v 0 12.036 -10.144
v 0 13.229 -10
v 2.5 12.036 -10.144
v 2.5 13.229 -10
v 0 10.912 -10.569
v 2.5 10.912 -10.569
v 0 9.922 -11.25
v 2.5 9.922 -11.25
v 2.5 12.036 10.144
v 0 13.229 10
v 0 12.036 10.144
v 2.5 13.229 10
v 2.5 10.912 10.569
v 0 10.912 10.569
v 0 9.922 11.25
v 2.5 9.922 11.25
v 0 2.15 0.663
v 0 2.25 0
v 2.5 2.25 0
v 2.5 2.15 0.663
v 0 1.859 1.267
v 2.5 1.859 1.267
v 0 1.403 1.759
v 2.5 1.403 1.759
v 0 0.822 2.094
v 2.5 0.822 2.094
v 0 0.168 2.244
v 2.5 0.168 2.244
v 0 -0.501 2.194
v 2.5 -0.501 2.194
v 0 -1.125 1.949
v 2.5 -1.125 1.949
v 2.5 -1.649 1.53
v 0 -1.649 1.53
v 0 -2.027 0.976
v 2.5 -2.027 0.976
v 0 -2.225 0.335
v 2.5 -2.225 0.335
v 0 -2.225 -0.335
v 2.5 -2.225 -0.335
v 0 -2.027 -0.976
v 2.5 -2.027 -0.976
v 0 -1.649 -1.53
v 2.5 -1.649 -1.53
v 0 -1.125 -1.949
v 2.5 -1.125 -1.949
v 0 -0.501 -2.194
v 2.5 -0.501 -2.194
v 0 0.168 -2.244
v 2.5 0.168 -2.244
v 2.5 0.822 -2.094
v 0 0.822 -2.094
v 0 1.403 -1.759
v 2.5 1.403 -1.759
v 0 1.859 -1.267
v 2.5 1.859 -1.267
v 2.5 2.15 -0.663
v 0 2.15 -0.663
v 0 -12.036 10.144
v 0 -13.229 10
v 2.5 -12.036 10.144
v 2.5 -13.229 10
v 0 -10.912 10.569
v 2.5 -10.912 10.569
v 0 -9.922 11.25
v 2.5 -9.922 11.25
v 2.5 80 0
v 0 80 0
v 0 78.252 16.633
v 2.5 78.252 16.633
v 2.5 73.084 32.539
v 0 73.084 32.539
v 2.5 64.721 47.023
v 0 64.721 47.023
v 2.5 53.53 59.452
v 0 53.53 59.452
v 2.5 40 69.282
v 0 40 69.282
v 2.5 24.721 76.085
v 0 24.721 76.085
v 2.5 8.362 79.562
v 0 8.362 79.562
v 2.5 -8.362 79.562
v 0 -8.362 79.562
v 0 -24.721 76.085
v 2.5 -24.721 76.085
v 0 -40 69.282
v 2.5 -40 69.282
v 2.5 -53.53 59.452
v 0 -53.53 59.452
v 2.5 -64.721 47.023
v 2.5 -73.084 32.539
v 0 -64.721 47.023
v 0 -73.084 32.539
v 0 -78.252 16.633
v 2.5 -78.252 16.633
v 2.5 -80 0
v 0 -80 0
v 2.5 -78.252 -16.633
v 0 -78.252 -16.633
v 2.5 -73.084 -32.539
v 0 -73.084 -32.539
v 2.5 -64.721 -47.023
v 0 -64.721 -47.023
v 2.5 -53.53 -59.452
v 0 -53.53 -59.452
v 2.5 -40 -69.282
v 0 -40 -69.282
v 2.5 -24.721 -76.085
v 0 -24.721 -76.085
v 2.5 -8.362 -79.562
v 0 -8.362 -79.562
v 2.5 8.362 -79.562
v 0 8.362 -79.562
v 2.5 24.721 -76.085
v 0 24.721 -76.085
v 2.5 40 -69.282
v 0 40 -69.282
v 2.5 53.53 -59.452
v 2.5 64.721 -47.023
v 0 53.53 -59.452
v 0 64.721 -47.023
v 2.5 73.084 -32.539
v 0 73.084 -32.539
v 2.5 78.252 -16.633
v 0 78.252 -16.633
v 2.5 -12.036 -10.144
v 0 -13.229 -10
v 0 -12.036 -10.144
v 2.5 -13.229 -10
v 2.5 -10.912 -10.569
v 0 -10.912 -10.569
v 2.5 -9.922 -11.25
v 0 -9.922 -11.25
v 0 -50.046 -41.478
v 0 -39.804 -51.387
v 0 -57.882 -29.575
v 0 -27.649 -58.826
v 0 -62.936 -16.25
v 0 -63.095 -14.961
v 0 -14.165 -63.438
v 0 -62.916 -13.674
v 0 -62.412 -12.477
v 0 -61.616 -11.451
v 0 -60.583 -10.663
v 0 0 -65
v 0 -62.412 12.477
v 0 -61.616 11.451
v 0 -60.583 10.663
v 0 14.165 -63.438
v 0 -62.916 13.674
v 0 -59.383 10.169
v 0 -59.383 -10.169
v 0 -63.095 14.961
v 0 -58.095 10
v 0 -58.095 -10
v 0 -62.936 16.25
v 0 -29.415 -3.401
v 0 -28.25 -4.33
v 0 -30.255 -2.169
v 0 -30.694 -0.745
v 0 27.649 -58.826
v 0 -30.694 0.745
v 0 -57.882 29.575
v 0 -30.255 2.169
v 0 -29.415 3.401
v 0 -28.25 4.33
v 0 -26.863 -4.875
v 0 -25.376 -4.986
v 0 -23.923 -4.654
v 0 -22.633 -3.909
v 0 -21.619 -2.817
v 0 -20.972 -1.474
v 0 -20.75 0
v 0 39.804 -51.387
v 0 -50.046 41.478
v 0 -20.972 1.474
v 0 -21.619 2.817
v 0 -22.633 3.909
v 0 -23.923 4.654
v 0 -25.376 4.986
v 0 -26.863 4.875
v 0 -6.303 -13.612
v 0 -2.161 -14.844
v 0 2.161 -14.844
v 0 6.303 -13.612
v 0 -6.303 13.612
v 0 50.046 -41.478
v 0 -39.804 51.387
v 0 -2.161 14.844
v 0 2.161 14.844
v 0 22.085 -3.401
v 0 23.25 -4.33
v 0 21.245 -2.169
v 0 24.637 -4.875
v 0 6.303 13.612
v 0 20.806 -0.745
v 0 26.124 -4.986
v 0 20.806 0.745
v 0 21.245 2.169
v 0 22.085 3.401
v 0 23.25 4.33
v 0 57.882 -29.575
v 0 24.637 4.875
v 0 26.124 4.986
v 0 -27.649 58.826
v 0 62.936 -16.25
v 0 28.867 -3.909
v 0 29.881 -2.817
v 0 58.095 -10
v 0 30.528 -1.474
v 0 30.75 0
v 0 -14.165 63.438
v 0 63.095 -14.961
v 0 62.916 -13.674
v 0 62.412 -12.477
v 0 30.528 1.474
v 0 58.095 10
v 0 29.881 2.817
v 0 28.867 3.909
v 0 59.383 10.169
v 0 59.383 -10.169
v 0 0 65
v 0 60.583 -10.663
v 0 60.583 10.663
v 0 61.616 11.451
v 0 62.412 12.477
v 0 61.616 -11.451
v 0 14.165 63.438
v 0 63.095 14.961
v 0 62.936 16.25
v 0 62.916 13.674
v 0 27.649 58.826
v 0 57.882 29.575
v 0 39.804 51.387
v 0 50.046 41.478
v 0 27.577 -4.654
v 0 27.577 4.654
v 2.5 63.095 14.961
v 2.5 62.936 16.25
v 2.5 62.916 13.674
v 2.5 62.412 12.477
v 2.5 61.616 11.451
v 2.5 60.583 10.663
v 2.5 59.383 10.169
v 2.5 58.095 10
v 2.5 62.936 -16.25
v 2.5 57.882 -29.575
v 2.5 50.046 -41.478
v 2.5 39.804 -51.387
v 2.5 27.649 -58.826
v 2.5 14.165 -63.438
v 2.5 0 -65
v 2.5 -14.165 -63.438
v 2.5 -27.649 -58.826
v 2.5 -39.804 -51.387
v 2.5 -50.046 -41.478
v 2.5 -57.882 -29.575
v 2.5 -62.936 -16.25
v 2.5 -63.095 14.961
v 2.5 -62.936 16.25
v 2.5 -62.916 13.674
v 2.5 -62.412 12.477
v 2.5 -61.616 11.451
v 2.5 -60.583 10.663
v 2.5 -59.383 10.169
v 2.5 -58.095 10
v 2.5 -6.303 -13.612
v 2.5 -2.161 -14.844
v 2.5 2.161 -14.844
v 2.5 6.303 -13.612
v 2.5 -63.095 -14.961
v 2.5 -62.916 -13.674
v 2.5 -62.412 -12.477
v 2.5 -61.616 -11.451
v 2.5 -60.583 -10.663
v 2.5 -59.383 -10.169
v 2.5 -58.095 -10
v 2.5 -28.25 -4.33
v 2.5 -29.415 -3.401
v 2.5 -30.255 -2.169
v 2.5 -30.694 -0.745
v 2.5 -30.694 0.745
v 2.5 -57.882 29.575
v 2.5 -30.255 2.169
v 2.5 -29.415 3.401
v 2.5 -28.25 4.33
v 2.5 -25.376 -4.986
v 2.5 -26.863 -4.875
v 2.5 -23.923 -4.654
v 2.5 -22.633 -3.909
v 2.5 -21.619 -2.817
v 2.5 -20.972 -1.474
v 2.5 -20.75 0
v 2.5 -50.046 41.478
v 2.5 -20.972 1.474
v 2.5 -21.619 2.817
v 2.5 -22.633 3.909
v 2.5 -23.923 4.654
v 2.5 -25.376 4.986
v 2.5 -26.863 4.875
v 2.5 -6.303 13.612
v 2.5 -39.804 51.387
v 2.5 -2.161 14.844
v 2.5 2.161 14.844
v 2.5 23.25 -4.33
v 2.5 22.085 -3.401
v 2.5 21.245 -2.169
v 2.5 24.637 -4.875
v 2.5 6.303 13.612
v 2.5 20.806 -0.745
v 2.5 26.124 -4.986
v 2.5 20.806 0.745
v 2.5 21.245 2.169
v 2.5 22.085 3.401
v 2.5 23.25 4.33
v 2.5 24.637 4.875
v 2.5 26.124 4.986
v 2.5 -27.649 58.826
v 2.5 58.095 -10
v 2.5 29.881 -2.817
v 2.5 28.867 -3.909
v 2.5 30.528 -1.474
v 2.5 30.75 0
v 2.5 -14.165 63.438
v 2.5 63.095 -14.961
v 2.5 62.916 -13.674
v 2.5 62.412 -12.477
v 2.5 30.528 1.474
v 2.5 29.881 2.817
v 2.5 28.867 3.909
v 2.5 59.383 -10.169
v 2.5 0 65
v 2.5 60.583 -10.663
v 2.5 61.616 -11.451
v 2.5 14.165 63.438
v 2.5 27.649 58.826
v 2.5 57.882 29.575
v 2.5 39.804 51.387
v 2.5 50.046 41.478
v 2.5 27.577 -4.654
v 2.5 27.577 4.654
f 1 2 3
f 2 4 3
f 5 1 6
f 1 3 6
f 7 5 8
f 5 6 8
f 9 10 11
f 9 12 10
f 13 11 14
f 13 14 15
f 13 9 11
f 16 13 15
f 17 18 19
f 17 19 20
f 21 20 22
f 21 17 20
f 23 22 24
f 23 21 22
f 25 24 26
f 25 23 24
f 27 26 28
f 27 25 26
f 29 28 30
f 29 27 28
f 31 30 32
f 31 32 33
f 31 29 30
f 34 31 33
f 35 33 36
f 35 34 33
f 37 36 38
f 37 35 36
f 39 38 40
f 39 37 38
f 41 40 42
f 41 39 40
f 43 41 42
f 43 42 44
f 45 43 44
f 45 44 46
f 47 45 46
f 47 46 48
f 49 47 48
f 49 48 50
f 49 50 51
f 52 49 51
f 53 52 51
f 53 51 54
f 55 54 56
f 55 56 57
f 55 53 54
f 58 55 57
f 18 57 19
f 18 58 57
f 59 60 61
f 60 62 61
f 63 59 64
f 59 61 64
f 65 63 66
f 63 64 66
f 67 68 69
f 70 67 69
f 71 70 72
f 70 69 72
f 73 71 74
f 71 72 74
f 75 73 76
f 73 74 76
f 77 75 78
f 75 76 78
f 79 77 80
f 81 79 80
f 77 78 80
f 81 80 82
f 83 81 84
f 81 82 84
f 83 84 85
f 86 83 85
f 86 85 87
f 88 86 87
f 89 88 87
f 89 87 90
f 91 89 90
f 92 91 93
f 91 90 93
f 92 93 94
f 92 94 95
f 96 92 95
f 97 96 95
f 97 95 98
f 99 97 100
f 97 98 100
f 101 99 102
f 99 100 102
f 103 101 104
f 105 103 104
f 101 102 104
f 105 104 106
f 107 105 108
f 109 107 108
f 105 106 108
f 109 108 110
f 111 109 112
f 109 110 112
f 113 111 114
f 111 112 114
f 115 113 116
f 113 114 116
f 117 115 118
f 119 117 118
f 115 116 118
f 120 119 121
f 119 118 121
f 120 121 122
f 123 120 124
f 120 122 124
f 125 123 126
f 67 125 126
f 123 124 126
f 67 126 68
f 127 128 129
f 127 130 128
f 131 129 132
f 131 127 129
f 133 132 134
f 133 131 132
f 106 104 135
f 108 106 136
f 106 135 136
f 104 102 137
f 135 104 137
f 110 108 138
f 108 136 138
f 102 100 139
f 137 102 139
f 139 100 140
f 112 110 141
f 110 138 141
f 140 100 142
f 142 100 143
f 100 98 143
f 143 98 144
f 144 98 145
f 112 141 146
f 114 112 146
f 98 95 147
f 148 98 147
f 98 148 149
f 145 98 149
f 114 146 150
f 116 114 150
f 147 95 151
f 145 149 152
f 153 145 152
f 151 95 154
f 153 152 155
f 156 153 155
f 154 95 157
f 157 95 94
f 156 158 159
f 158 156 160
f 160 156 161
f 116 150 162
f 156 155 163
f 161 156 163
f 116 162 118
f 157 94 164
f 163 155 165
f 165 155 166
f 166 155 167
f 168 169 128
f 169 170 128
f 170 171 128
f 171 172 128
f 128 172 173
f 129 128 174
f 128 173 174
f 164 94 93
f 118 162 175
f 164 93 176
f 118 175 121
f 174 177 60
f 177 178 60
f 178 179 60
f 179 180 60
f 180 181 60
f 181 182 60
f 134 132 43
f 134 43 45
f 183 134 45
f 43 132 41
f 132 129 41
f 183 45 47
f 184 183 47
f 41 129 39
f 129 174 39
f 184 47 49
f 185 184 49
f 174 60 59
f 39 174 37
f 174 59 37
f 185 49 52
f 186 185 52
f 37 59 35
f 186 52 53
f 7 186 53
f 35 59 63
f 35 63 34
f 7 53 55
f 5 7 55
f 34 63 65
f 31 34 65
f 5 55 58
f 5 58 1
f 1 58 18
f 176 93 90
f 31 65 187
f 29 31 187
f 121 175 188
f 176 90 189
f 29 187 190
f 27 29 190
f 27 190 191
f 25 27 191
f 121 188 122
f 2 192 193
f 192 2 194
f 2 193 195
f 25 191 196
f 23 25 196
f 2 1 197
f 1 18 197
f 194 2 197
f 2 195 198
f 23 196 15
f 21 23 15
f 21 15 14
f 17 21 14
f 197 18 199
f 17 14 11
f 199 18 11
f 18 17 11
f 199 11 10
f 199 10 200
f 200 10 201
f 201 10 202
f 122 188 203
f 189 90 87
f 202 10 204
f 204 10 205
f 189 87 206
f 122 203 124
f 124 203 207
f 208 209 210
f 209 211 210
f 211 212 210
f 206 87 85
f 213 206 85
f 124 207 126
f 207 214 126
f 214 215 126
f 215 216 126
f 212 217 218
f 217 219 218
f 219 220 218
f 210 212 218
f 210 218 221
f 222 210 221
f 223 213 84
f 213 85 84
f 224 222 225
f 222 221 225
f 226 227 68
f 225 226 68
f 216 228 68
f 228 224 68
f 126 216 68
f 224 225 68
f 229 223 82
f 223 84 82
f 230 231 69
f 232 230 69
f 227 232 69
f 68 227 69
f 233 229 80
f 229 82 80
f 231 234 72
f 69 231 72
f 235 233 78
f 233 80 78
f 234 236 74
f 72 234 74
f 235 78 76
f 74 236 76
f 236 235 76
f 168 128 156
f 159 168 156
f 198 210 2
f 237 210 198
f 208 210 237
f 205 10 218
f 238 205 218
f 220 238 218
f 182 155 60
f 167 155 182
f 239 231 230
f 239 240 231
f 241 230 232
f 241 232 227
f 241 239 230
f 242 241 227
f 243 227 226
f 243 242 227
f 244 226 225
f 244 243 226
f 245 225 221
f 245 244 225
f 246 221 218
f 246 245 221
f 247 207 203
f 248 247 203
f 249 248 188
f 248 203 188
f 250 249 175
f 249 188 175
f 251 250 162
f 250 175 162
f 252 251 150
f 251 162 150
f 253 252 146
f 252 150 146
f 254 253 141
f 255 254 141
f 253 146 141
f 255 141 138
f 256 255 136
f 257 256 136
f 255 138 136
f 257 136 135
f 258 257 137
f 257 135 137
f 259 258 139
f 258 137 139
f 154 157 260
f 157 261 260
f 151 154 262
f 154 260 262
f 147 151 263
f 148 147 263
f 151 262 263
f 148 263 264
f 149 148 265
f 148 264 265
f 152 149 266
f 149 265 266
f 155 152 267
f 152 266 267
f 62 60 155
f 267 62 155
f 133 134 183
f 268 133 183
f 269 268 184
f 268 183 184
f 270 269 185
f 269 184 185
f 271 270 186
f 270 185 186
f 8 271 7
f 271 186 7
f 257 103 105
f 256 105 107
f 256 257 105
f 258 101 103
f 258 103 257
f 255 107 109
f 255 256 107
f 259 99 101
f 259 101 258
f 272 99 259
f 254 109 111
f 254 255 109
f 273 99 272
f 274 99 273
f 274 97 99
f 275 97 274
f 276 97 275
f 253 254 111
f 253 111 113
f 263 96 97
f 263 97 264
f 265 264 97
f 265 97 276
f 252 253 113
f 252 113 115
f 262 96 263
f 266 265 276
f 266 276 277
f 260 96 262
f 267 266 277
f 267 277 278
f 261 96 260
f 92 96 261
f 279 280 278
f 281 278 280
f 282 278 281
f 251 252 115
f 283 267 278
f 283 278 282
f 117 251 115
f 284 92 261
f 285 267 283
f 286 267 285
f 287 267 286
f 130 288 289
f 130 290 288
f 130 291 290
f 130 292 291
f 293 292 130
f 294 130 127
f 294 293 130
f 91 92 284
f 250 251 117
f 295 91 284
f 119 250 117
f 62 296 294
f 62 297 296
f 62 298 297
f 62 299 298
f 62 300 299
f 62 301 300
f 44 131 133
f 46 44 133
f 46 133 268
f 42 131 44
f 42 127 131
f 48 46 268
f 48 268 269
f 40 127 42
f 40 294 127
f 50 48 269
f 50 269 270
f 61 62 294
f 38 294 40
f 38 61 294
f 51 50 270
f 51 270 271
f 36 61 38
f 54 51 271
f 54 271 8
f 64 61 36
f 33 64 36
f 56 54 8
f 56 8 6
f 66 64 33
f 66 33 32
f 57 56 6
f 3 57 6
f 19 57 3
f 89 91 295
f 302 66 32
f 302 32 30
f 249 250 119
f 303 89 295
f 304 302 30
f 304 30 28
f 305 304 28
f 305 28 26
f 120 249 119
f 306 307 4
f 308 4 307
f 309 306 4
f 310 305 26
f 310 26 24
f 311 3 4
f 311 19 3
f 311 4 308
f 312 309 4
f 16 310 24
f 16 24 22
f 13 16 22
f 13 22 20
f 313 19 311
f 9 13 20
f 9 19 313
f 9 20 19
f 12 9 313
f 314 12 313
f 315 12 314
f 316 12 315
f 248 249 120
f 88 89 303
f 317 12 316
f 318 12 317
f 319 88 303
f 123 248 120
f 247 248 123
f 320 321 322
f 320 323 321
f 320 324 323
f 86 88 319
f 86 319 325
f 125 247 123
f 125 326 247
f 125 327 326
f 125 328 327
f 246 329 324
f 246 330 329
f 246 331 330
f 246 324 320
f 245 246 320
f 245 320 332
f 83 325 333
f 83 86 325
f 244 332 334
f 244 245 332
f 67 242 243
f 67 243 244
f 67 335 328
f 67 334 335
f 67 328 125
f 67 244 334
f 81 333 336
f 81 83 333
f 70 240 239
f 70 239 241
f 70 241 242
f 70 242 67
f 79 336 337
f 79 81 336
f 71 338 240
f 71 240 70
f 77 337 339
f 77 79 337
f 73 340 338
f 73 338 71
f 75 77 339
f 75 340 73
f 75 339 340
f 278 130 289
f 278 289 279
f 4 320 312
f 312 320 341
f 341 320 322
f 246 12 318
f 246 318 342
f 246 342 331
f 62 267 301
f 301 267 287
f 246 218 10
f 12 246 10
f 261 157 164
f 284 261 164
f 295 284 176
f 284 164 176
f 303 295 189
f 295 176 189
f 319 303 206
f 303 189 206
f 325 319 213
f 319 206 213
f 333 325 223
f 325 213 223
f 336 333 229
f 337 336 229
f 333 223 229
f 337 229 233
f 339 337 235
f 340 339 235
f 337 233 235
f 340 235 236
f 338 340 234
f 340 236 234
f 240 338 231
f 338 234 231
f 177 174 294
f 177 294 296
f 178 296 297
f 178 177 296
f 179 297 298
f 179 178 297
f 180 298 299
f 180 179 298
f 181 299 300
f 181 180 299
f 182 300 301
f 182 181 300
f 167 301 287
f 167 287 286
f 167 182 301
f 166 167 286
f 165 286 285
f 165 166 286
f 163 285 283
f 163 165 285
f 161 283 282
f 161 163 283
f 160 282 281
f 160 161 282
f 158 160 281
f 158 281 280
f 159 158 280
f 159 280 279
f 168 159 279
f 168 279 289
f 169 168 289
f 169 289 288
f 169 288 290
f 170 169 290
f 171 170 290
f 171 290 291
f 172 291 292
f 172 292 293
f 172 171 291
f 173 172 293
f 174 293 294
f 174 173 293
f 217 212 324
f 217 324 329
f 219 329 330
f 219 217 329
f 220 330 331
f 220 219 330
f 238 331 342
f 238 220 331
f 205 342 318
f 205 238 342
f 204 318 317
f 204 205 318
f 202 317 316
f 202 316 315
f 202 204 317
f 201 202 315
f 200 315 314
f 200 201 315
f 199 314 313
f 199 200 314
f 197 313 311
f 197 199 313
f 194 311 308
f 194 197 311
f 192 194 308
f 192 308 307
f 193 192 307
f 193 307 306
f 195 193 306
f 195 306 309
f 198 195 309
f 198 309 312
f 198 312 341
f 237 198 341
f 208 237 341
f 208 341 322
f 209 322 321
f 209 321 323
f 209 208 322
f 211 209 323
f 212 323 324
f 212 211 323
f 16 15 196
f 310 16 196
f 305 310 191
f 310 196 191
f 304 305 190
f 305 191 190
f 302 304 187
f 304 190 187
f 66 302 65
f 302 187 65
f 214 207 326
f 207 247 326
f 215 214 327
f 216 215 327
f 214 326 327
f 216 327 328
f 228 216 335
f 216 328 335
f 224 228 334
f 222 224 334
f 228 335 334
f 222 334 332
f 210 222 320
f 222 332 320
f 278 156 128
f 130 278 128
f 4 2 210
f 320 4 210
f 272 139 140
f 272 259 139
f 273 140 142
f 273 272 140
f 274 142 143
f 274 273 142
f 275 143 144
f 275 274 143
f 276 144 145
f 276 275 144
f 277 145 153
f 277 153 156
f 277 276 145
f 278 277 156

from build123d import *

# Parameters (mm, degrees)
F0_R     = 80
F0_R_2   = 5
F0_R_3   = 2.25
F1_DEPTH = 2.5
F2_R     = 5


with BuildPart() as f1:
    # F0 (on Right) → F1 (new body)
    with BuildSketch(Plane.YZ):
        Circle(F0_R)
        with BuildLine():
            ThreePointArc((-64.226163, 10), (0, 65), (64.226163, 10))
            ThreePointArc((64.226163, 10), (64.806252, 5.014948), (65, 0))
            ThreePointArc((65, 0), (64.806252, -5.014948), (64.226163, -10))
            ThreePointArc((64.226163, -10), (0, -65), (-64.226163, -10))
            ThreePointArc((-64.226163, -10), (-65, 0), (-64.226163, 10))
        make_face(mode=Mode.SUBTRACT)
        with BuildLine():
            ThreePointArc((-11.18034, -10), (-15, 0), (-11.18034, 10))
            Line((-11.18034, 10), (-64.226163, 10))
            ThreePointArc((-64.226163, 10), (-65, 0), (-64.226163, -10))
            Line((-64.226163, -10), (-11.18034, -10))
        make_face()
        with Locations((-25.75, 0)):
            Circle(F0_R_2, mode=Mode.SUBTRACT)
        with BuildLine():
            ThreePointArc((11.18034, -10), (14.012585, -5.352331), (15, 0))
            ThreePointArc((15, 0), (14.012585, 5.352331), (11.18034, 10))
            ThreePointArc((11.18034, 10), (0, 15), (-11.18034, 10))
            ThreePointArc((-11.18034, 10), (-15, 0), (-11.18034, -10))
            ThreePointArc((-11.18034, -10), (0, -15), (11.18034, -10))
        make_face()
        Circle(F0_R_3, mode=Mode.SUBTRACT)
        with BuildLine():
            ThreePointArc((11.18034, 10), (14.012585, 5.352331), (15, 0))
            ThreePointArc((15, 0), (14.012585, -5.352331), (11.18034, -10))
            Line((11.18034, -10), (64.226163, -10))
            ThreePointArc((64.226163, -10), (64.806252, -5.014948), (65, 0))
            ThreePointArc((65, 0), (64.806252, 5.014948), (64.226163, 10))
            Line((64.226163, 10), (11.18034, 10))
        make_face()
        with Locations((25.75, 0)):
            Circle(F0_R_2, mode=Mode.SUBTRACT)
    extrude(amount=F1_DEPTH)

    # F2
    f2_edges = [f1.edges().sort_by_distance(p)[0] for p in [
        (1.25, -64.226163, 10),
        (1.25, -11.18034, 10),
        (1.25, 11.18034, 10),
        (1.25, 64.226163, 10),
        (1.25, 64.226163, -10),
        (1.25, 11.18034, -10),
        (1.25, -11.18034, -10),
        (1.25, -64.226163, -10),
    ]]
    fillet(f2_edges, radius=F2_R)


solid = f1.part
